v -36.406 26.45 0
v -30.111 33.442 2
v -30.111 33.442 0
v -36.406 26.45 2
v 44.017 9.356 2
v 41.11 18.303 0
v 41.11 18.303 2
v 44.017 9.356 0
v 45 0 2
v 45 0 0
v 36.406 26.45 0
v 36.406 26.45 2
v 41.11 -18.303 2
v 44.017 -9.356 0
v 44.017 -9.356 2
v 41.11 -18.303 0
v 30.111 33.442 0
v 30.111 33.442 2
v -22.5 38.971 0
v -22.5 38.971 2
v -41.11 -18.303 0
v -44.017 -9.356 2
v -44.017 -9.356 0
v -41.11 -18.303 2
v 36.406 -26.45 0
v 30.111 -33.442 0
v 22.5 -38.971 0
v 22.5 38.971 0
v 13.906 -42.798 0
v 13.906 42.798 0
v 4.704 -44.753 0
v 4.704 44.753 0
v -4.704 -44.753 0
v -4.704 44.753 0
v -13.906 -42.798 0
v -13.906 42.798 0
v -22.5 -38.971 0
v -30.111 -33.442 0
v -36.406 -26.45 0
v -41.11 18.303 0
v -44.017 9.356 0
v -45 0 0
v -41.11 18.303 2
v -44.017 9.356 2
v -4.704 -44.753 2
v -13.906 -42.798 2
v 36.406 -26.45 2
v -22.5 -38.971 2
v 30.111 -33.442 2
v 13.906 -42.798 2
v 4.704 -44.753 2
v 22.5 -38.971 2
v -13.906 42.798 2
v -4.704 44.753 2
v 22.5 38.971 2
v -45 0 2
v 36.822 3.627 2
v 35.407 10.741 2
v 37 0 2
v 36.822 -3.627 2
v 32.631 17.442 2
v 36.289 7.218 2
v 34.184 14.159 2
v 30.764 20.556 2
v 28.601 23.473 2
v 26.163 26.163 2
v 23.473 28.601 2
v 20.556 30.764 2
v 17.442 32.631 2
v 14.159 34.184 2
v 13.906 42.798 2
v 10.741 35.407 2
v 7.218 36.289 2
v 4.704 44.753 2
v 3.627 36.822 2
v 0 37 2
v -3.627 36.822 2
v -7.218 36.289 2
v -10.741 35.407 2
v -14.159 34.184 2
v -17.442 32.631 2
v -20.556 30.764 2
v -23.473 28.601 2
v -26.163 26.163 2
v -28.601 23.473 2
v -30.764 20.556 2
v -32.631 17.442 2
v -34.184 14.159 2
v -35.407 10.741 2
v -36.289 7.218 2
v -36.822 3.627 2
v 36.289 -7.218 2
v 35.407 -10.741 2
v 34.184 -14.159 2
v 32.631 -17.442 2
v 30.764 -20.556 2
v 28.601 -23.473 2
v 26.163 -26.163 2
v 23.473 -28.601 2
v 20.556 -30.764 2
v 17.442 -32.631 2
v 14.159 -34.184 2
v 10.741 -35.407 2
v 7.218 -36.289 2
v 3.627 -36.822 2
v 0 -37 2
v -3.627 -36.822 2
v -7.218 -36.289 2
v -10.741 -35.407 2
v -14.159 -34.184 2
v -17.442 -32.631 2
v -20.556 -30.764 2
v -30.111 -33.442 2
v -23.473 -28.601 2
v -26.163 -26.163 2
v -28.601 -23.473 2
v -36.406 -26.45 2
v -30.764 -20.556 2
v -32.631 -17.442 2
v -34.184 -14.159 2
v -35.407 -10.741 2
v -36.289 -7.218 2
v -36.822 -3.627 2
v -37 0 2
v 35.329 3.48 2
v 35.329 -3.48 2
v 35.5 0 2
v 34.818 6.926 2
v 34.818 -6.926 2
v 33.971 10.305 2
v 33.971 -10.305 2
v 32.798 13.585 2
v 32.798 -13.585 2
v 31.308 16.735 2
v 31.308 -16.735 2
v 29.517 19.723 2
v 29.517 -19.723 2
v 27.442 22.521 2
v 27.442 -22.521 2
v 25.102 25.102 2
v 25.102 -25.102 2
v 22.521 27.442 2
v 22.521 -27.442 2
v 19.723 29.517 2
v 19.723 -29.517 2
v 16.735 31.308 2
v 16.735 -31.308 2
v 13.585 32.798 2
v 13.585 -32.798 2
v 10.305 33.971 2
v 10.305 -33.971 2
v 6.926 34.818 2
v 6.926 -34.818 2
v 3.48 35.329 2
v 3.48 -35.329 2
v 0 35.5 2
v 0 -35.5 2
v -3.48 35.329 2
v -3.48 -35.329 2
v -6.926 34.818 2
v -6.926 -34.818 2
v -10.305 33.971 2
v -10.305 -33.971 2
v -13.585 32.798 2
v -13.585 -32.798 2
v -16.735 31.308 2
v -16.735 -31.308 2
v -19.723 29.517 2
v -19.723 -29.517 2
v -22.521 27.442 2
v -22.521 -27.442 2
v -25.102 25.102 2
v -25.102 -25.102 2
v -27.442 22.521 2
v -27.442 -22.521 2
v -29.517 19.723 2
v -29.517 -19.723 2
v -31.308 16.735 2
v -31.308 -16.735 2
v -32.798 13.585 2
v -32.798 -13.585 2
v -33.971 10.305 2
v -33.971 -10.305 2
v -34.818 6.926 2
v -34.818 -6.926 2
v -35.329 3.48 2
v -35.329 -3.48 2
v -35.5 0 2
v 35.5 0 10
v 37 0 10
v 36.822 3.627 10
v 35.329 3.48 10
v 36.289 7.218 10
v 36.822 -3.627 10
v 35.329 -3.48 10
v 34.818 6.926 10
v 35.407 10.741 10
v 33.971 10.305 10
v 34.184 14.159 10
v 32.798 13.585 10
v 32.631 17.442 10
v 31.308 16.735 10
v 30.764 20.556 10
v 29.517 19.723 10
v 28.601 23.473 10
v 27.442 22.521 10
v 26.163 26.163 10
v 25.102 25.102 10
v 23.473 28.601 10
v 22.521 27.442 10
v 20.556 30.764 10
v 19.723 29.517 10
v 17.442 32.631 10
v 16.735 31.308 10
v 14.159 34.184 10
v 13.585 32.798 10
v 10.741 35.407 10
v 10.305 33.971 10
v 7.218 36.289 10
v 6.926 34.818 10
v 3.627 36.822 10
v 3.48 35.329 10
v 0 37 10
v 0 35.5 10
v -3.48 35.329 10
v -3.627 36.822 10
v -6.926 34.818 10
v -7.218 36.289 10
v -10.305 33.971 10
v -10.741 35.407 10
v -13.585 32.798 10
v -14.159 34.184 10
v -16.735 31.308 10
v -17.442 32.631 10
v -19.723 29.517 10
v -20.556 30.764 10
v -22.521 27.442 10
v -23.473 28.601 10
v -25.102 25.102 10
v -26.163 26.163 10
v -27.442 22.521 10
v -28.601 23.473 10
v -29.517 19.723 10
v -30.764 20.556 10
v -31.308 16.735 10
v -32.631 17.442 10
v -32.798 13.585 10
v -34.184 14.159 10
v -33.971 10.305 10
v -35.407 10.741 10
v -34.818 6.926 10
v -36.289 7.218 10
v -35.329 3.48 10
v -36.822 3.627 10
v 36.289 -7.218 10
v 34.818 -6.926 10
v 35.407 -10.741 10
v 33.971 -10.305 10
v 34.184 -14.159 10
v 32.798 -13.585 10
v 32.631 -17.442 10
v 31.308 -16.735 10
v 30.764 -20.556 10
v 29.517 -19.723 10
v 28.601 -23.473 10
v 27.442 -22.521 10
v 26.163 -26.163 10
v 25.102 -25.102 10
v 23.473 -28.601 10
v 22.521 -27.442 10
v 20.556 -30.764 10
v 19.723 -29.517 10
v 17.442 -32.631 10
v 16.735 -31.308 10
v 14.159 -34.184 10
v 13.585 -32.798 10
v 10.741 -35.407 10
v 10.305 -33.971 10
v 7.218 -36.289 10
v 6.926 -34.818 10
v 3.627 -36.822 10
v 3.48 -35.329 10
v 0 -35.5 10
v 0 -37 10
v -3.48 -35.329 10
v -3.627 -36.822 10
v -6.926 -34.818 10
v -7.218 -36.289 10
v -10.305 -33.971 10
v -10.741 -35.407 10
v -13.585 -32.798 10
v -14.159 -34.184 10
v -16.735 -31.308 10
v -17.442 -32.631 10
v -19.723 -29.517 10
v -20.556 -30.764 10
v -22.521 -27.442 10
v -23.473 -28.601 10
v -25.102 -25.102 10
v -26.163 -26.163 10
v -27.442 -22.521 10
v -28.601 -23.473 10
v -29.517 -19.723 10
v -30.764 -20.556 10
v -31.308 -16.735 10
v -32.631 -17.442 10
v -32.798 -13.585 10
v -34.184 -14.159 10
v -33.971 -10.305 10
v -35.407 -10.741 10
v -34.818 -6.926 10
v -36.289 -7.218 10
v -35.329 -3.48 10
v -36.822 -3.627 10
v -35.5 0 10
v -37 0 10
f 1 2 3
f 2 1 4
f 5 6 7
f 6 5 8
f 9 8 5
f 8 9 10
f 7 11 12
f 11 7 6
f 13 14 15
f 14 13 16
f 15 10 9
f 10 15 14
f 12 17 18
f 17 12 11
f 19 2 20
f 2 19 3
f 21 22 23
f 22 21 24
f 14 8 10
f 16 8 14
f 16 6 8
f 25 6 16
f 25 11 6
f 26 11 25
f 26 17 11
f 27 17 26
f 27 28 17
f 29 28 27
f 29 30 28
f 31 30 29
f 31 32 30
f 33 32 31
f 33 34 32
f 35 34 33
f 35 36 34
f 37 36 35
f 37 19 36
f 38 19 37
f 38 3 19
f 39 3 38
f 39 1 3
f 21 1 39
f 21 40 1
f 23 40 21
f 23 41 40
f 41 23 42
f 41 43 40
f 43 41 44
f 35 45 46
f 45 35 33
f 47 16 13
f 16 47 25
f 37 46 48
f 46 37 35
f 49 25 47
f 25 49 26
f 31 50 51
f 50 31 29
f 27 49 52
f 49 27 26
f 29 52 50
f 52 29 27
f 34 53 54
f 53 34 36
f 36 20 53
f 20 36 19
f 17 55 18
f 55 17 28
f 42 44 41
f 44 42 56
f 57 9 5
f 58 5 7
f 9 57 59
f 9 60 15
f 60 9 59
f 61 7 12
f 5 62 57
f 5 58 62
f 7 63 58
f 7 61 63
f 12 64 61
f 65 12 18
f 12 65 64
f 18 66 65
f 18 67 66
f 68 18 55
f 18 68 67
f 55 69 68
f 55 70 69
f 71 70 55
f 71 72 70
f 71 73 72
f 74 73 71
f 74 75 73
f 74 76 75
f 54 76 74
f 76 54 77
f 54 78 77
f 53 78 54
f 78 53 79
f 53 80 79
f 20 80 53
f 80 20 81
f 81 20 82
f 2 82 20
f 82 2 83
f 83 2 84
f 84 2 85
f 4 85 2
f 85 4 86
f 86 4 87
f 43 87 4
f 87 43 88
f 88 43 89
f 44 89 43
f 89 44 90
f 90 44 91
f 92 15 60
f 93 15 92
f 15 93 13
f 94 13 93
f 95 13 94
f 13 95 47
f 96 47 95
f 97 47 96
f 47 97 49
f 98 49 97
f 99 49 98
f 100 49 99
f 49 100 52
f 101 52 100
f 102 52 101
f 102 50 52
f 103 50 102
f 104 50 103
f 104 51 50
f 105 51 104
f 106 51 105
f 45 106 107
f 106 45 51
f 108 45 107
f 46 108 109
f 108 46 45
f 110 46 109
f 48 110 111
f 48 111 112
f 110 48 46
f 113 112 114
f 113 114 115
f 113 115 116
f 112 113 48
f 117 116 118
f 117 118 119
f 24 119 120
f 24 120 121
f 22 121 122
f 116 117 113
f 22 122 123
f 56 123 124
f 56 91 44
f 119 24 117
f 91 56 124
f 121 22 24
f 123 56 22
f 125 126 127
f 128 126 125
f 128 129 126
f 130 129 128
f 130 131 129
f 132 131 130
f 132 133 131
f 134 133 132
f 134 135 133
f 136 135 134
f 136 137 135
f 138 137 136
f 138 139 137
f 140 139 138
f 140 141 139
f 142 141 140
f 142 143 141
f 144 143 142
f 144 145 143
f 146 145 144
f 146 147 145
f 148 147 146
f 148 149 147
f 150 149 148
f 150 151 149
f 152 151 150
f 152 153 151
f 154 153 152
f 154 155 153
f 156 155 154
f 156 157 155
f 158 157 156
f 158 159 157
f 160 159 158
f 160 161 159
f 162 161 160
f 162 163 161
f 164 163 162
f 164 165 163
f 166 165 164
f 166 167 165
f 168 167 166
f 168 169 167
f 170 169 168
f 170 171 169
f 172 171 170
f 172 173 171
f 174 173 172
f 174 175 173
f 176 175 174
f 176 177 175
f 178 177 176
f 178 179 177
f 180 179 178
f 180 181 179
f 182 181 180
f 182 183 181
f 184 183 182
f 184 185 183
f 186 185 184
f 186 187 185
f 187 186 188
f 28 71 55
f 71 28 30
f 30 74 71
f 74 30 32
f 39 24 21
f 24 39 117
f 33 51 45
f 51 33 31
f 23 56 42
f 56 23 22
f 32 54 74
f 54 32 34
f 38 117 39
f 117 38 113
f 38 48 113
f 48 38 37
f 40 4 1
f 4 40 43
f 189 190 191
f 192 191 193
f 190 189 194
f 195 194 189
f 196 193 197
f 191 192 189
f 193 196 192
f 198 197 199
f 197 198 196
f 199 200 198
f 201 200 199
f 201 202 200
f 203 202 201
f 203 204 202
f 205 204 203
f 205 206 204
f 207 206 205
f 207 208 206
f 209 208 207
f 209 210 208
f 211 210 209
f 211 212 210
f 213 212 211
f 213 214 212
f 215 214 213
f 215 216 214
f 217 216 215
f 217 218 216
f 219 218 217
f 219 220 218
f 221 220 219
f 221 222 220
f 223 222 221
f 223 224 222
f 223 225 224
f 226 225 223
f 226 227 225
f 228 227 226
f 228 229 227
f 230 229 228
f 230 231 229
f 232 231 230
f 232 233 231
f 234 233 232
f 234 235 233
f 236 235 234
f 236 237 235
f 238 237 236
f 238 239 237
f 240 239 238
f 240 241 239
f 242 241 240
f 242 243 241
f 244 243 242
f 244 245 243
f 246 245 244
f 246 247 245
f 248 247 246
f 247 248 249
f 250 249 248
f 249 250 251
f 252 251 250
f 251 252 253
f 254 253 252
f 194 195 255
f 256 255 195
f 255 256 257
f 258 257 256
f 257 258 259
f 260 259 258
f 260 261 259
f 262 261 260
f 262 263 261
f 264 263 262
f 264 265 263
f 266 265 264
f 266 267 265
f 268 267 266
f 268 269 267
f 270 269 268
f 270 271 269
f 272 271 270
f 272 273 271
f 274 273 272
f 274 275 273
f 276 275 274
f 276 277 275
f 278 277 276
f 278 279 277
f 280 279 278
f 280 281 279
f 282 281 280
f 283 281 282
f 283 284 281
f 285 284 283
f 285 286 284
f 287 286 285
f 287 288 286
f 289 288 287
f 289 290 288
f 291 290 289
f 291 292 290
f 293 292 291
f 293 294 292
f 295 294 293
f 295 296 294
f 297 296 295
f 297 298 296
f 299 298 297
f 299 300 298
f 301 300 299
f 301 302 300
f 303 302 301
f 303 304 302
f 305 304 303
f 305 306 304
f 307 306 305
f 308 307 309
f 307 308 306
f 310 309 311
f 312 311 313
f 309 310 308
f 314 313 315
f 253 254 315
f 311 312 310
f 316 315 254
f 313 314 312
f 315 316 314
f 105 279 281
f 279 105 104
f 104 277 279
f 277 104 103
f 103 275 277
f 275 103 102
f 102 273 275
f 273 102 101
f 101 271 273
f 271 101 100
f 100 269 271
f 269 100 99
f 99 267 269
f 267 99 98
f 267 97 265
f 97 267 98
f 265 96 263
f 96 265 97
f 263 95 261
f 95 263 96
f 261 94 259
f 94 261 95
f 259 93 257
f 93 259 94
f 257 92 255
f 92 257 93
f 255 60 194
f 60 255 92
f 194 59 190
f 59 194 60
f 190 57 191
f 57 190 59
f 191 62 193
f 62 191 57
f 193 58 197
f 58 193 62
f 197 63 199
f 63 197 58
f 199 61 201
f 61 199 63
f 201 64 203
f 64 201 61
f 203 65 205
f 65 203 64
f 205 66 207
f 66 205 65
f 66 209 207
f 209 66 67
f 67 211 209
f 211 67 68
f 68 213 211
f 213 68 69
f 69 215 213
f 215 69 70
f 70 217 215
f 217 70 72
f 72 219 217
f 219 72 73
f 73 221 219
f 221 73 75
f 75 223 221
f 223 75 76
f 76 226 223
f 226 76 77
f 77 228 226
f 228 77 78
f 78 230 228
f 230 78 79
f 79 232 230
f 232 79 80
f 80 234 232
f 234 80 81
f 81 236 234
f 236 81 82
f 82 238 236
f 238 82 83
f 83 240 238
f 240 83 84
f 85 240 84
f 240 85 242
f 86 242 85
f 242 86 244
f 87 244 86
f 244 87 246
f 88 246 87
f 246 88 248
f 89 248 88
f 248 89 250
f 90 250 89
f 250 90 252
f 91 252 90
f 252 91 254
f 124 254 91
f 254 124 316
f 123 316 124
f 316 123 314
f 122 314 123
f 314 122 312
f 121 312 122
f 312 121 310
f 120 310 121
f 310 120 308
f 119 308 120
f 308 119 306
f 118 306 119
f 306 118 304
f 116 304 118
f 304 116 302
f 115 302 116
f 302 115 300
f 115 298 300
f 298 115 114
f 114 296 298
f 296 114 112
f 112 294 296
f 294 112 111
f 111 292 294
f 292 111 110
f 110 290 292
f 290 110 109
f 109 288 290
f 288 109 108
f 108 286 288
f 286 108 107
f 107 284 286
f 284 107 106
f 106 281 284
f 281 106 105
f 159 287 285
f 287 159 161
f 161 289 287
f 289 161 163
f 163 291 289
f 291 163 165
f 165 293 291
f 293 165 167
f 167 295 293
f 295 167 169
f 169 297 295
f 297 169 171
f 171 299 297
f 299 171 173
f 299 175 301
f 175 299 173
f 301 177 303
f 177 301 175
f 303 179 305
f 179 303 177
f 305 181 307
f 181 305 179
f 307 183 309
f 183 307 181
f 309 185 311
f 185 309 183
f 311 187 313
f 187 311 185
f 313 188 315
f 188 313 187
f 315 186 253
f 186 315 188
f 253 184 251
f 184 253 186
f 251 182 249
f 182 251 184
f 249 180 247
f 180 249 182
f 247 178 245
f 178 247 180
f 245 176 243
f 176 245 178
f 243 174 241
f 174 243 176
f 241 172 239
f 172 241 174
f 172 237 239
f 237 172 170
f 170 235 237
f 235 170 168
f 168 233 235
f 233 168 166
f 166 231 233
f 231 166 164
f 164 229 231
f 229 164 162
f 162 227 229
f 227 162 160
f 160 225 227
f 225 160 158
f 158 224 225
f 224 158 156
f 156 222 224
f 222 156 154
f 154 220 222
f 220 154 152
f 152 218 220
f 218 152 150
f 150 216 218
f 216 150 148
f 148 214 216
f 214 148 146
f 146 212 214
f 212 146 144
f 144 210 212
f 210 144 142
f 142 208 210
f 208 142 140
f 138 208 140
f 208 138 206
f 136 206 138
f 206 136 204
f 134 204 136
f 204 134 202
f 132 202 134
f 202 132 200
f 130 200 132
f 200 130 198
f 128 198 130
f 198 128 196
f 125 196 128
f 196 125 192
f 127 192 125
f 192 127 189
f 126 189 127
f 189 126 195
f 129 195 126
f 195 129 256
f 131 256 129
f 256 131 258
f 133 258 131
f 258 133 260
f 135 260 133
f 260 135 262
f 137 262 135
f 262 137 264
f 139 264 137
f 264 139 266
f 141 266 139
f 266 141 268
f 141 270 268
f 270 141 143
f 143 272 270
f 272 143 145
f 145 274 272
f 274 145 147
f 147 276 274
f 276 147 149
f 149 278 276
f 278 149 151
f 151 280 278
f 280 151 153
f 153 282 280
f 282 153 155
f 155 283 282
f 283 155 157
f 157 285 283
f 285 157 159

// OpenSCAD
cylinder(d=90, h=2);
linear_extrude(10, convexity=4) difference() {
    circle(d=74, $fn=64);
    circle(d=71, $fn=64);
}
